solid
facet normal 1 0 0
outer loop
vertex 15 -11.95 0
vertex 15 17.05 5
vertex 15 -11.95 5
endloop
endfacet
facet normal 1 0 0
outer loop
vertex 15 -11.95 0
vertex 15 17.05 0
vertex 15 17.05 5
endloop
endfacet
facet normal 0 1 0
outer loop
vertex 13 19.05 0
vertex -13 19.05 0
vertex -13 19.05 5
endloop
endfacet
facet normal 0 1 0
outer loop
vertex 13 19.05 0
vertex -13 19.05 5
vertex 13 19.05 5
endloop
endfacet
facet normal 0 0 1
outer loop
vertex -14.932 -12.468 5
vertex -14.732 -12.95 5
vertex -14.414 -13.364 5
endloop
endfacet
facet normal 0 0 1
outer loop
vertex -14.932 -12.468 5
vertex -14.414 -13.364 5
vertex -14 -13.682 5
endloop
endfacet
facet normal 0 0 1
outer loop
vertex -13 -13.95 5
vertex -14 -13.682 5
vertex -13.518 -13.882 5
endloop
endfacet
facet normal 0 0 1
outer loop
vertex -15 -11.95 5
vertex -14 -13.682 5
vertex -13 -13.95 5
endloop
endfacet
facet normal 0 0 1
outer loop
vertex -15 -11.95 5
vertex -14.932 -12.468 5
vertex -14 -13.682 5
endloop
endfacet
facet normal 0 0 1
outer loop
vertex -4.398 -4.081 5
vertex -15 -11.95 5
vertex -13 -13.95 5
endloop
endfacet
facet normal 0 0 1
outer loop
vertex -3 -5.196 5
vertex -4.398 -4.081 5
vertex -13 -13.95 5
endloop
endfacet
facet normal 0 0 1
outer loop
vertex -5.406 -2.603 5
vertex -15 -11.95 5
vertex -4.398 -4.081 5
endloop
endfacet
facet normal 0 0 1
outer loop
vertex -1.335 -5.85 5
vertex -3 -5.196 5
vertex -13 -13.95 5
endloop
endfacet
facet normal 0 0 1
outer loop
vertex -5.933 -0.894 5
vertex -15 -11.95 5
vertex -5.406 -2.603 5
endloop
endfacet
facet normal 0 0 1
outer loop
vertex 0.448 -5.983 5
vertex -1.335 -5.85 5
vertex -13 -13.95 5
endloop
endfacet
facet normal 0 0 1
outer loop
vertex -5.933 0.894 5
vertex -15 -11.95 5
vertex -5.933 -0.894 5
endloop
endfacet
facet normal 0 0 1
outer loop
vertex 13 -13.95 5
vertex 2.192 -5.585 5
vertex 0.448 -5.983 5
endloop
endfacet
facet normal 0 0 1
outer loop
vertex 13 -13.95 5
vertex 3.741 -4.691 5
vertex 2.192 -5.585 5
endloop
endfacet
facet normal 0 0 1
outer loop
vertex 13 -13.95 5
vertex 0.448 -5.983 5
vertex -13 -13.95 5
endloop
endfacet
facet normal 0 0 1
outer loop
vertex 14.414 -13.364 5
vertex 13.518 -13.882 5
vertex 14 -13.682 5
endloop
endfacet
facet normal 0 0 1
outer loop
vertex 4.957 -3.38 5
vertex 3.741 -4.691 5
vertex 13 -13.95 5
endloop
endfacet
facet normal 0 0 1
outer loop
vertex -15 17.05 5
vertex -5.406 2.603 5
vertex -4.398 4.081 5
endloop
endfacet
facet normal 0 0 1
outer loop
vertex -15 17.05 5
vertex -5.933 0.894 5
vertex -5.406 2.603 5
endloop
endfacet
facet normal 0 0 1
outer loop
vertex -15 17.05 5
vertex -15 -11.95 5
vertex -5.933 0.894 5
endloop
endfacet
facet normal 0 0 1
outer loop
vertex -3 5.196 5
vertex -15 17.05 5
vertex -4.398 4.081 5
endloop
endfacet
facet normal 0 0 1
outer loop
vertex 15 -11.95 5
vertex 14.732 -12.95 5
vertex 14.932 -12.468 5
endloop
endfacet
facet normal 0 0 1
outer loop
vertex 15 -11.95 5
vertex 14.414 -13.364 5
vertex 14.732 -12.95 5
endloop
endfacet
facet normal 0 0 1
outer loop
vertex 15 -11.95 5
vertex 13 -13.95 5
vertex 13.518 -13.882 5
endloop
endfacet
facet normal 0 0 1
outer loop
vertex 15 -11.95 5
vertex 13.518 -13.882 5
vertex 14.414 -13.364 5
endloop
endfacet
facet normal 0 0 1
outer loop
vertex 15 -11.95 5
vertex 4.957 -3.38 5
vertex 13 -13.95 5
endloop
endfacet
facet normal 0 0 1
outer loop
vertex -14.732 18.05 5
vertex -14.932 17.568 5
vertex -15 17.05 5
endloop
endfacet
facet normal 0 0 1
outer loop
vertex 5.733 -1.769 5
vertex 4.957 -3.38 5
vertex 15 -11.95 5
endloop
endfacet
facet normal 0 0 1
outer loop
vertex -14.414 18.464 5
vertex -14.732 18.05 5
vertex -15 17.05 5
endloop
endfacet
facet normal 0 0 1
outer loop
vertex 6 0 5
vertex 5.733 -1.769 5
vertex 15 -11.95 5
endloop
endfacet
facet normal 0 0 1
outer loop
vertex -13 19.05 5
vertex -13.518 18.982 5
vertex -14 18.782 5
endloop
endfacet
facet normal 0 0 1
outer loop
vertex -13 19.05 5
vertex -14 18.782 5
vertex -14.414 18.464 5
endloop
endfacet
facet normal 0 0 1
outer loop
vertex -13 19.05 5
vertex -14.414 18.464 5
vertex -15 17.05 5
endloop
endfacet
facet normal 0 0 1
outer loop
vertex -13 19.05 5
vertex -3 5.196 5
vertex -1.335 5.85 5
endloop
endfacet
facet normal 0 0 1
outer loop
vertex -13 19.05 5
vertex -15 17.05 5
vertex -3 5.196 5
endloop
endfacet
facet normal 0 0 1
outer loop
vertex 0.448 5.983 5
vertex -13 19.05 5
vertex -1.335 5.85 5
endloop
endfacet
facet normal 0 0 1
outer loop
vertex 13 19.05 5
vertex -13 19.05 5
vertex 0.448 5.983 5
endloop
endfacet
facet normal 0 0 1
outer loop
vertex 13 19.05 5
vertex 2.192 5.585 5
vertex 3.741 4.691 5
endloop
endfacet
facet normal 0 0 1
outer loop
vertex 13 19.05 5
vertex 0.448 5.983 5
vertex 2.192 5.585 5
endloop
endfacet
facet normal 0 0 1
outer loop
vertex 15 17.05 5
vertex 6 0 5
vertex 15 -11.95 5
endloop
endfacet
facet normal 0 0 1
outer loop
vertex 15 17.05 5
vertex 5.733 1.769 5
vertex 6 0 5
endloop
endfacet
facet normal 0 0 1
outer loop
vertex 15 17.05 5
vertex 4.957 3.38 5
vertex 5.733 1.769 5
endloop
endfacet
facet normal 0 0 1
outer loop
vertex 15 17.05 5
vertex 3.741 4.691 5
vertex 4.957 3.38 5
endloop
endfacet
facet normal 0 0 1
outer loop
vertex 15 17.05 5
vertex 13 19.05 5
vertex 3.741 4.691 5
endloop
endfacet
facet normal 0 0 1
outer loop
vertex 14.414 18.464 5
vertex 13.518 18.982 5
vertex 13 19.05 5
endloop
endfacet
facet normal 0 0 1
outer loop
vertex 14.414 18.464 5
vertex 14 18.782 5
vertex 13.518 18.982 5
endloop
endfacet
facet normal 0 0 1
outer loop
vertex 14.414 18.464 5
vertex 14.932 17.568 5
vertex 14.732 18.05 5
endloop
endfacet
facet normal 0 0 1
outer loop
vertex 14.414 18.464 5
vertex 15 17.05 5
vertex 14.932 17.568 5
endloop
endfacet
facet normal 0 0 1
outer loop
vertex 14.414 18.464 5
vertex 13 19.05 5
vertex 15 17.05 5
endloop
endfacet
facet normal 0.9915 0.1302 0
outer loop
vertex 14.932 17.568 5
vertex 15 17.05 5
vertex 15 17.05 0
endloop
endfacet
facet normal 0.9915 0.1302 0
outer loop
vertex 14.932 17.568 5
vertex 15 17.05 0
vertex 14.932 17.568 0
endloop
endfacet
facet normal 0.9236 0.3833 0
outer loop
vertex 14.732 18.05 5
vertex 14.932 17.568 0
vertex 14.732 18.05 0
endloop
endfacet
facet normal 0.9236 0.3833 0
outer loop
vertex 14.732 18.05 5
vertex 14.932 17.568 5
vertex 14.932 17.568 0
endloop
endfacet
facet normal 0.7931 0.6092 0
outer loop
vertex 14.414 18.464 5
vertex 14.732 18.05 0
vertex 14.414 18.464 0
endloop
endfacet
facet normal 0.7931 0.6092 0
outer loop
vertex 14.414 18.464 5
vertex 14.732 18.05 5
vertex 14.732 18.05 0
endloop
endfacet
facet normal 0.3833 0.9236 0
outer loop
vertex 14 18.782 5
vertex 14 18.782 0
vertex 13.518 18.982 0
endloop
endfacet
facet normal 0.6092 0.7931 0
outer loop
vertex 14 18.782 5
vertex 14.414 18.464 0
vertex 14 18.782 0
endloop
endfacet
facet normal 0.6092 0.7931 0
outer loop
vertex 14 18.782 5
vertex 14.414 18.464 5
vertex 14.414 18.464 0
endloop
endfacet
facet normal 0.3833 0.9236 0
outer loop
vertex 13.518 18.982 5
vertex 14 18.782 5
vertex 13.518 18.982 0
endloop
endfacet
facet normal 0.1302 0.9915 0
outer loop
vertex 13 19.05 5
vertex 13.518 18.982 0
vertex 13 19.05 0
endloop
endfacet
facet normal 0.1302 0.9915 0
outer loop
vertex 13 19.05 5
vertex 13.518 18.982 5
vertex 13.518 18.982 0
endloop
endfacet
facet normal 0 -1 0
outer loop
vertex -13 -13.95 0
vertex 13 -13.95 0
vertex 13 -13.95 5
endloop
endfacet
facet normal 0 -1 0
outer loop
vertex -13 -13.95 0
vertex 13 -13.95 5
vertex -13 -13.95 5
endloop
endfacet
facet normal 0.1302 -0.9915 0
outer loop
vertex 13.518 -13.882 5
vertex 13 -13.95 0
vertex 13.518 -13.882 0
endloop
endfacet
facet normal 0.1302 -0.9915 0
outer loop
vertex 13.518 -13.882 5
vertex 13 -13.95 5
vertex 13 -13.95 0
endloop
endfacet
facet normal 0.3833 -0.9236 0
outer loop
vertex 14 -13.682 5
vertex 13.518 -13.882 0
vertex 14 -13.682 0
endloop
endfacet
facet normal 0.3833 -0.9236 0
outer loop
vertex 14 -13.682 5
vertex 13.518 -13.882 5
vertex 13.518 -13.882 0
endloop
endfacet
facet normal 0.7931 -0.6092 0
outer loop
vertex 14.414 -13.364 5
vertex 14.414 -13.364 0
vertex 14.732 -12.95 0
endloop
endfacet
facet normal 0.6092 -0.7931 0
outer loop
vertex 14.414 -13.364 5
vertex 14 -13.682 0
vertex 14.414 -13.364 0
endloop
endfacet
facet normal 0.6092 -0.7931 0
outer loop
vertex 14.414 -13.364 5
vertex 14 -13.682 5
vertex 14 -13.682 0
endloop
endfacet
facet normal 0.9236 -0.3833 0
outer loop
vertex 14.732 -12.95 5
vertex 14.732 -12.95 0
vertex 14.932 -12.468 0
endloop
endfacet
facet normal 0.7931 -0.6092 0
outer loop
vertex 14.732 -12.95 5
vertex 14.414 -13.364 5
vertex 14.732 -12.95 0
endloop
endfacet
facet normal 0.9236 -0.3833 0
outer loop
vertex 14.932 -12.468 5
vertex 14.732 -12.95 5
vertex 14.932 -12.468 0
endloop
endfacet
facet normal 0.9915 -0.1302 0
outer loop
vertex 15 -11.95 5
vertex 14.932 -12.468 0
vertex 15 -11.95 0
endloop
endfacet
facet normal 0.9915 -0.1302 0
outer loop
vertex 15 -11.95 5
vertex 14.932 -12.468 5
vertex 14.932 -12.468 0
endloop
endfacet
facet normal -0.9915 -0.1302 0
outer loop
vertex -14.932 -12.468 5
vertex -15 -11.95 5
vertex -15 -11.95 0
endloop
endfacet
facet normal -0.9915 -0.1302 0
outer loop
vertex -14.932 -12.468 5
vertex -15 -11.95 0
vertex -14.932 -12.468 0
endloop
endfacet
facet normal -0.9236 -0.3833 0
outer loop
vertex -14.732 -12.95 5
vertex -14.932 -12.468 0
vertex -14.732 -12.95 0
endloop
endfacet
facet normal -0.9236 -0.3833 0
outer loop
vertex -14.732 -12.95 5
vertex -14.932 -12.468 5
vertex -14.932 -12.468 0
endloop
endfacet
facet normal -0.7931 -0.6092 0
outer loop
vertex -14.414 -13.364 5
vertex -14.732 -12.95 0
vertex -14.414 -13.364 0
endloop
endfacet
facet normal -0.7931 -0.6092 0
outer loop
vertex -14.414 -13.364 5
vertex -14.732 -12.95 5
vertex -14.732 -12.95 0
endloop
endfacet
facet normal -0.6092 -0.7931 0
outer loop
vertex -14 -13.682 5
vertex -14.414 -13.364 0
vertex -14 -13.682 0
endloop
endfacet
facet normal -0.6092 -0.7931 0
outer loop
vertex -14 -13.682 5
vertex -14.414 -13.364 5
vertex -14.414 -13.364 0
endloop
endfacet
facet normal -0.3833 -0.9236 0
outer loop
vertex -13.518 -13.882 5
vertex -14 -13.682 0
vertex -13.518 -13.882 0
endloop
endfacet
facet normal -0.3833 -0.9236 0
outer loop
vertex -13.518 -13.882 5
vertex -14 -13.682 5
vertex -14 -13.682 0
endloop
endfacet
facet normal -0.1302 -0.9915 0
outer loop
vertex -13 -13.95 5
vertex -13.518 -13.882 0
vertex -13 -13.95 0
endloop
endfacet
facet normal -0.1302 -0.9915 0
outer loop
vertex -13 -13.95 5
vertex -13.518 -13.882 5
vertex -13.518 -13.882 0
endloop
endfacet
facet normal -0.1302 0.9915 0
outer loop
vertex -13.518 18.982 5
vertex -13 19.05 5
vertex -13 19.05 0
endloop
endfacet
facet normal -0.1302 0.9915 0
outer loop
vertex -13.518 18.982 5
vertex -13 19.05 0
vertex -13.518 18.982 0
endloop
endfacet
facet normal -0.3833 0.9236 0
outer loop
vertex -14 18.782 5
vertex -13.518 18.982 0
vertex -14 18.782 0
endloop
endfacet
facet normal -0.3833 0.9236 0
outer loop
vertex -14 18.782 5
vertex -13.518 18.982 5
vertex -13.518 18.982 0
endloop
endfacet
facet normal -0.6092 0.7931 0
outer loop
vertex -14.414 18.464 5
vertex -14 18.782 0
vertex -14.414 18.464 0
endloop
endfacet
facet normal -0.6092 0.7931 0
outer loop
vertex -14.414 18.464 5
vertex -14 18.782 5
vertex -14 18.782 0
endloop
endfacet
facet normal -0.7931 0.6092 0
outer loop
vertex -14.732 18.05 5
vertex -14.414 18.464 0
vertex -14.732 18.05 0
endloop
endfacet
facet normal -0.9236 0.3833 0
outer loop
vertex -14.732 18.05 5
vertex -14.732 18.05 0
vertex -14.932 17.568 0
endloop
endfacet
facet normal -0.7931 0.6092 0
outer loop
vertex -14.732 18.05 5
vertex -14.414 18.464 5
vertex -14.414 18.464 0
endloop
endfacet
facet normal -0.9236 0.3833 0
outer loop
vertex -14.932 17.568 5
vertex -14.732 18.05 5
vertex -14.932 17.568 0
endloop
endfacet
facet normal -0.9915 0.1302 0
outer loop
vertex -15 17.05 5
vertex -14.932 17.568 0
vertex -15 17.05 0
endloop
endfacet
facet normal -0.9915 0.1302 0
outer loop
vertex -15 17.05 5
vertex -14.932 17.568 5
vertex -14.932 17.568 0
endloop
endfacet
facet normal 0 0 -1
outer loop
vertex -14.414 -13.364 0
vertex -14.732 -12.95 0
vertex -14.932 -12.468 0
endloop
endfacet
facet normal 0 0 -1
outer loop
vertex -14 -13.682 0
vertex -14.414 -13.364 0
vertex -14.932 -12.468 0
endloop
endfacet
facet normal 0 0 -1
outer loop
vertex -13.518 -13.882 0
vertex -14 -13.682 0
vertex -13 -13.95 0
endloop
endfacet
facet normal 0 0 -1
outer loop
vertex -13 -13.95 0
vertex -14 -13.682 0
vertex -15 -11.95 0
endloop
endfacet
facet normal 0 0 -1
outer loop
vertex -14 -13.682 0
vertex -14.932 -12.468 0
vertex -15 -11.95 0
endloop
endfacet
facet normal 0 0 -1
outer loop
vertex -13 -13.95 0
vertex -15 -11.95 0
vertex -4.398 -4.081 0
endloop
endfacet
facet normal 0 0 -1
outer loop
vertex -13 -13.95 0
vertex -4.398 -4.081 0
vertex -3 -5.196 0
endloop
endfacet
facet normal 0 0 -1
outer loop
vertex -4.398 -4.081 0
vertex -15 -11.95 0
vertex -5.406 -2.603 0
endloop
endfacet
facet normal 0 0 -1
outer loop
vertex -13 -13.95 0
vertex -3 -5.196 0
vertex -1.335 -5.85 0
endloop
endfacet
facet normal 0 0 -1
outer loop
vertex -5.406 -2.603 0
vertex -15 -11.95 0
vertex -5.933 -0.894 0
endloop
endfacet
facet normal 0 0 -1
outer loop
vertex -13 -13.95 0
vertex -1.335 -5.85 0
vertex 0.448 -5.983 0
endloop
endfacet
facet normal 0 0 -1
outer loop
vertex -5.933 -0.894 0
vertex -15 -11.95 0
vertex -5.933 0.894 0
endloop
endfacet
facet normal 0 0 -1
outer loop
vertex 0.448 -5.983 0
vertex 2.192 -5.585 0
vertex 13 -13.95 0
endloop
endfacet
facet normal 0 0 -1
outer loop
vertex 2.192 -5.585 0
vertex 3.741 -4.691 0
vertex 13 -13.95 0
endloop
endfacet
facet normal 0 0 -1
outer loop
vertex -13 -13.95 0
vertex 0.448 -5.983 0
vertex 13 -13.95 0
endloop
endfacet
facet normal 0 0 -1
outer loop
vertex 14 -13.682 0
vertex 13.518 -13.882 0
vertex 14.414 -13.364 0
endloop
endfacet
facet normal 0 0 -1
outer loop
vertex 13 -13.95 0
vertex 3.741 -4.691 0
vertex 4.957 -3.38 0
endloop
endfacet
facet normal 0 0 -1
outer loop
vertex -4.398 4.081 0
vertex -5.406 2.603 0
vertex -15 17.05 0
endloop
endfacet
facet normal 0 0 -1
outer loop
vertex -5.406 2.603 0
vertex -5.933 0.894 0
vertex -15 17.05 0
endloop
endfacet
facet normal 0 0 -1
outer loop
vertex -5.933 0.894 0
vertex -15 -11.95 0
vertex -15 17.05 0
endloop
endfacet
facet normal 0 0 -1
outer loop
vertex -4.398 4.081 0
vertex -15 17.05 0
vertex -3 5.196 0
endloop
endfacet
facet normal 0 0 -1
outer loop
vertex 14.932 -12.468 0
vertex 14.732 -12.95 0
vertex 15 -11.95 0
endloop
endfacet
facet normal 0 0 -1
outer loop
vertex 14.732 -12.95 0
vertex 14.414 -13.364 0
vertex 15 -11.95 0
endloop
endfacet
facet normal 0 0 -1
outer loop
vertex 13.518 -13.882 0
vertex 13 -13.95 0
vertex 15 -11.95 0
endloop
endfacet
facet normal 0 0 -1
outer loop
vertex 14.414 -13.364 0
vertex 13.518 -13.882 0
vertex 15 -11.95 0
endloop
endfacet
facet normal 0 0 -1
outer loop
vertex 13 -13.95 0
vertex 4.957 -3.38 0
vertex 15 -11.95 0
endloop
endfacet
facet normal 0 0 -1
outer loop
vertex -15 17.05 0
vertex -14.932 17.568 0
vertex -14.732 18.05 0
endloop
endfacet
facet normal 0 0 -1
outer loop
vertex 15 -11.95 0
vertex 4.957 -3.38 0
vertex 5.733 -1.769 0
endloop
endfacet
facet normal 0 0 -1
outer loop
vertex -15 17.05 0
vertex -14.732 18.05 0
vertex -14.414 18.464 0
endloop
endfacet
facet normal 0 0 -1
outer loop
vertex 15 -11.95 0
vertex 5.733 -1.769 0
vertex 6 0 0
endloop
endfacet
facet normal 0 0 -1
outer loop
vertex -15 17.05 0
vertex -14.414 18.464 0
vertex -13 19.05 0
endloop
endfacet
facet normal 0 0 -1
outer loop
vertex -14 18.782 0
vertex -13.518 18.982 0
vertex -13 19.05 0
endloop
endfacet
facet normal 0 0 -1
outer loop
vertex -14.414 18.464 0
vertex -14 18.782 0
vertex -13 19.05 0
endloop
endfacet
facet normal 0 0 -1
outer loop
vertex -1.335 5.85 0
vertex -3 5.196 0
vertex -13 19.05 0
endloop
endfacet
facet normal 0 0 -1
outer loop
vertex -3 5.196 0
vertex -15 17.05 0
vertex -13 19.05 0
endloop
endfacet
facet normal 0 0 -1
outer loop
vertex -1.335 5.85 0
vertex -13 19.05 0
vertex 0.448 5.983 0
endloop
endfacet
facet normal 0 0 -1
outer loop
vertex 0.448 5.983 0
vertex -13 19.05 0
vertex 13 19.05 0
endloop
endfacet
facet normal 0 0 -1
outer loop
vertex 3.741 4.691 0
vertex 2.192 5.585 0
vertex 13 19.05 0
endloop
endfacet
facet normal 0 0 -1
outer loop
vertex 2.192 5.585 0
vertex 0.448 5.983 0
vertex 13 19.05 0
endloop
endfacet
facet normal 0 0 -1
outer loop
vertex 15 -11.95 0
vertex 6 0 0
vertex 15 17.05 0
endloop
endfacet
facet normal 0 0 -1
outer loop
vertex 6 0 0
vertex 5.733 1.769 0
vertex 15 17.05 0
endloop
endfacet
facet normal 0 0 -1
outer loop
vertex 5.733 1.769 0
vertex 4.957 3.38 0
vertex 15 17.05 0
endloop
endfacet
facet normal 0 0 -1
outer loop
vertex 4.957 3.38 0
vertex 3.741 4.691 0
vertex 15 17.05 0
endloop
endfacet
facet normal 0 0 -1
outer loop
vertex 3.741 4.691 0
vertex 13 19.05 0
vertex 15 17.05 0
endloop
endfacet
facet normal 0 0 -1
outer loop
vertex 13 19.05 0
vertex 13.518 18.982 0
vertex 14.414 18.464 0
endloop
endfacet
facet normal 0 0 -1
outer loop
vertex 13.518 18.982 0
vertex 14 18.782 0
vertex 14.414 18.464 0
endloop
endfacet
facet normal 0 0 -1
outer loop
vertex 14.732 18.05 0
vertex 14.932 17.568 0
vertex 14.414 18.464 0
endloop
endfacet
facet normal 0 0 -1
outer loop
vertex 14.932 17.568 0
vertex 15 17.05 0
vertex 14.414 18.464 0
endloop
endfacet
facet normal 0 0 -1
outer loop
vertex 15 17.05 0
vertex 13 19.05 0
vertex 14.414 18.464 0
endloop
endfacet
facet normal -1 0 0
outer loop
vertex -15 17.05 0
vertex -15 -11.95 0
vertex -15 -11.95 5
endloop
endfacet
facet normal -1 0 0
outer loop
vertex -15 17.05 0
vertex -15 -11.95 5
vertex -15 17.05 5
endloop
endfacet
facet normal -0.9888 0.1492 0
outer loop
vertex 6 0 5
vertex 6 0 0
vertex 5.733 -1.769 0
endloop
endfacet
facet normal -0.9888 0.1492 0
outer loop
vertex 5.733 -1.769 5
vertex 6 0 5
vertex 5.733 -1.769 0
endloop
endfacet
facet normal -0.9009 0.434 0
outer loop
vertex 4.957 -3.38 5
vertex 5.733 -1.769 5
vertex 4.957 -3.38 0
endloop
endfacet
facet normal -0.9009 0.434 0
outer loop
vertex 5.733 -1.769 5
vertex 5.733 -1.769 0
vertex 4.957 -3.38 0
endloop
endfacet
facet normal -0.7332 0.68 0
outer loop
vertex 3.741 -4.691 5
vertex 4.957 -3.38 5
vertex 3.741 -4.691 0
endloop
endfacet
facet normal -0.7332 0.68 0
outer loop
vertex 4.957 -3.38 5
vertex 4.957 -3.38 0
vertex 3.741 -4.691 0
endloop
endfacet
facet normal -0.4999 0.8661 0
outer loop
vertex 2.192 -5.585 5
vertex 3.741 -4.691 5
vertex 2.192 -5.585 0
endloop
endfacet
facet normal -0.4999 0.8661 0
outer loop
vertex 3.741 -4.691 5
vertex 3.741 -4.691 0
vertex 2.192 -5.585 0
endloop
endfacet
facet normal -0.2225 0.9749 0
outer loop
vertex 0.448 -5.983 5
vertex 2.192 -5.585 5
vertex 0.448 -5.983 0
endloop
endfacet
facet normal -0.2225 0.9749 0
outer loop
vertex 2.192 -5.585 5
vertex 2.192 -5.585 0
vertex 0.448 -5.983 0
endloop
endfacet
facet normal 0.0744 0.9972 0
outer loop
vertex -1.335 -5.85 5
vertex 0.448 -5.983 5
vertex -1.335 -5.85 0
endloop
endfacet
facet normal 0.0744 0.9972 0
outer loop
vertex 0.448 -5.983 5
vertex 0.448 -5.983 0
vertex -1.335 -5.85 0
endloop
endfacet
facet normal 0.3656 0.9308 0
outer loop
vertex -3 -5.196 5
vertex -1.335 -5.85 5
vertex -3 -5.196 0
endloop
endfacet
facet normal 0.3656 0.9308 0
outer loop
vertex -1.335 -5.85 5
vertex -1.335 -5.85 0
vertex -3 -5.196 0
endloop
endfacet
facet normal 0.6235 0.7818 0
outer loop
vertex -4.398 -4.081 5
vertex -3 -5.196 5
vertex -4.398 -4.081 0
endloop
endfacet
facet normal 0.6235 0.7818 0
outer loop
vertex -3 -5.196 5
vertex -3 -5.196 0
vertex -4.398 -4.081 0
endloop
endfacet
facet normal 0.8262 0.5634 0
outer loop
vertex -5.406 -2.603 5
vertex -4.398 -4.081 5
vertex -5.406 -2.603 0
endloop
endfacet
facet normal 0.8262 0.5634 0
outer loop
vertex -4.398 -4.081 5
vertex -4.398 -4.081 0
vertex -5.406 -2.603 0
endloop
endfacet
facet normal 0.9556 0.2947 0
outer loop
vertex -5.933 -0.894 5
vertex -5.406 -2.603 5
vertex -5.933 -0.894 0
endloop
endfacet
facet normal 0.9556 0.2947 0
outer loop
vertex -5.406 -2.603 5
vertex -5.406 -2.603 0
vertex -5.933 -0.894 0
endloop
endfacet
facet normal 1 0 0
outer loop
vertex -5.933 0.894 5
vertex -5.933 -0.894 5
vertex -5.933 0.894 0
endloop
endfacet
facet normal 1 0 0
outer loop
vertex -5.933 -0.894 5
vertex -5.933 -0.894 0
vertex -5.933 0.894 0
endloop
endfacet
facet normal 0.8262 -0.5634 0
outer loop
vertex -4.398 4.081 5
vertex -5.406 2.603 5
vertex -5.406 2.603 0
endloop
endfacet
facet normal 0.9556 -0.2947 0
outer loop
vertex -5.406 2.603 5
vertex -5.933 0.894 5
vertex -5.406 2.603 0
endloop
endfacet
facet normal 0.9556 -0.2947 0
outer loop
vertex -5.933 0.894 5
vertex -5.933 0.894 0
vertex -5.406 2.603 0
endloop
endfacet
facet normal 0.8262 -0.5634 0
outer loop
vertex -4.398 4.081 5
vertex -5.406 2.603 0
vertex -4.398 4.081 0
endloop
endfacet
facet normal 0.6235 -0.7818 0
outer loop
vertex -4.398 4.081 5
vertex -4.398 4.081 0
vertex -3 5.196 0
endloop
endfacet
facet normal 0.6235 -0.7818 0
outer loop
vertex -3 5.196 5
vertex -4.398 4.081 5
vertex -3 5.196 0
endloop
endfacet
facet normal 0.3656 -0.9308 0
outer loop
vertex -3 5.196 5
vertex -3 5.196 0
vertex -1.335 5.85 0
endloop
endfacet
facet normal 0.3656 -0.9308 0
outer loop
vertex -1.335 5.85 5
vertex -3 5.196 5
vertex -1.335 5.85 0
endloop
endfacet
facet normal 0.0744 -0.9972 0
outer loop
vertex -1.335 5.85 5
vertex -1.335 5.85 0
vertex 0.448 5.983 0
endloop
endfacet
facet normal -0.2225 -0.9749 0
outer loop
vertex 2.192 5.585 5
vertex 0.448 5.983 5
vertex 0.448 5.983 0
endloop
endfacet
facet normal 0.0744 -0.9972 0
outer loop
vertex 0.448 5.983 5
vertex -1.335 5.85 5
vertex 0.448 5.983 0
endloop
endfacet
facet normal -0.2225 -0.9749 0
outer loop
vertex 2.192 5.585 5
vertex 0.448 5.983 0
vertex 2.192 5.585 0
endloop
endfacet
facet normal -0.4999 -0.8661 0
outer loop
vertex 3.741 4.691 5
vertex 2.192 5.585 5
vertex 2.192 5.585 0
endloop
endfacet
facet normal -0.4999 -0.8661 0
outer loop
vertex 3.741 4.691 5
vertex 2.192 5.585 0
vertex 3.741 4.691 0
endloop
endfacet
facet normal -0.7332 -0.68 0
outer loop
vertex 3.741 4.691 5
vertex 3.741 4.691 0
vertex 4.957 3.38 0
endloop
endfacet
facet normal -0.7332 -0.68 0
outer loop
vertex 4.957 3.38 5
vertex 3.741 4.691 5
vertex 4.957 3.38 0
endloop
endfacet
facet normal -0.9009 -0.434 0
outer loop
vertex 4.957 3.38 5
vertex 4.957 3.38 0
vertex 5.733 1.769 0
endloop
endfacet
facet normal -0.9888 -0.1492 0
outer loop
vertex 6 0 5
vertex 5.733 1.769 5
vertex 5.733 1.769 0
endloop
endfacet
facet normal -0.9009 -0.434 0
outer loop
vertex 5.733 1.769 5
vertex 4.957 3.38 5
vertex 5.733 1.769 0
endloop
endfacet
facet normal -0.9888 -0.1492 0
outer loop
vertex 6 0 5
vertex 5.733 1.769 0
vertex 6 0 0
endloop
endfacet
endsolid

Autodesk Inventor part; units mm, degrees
ref_plane "YZ Plane" through (0, 0, 0) normal (1, 0, 0) x (0, 1, 0)
ref_plane "XZ Plane" through (0, 0, 0) normal (0, 1, 0) x (-1, 0, 0)
ref_plane "XY Plane" through (0, 0, 0) normal (0, 0, 1) x (1, 0, 0)
sketch "スケッチ1" plane through (0, 0, 0) normal (0, 0, 1) x (1, 0, 0)
  line L0 (-15, 19.05) -> (15, 19.05)
  line L1 (15, 19.05) -> (15, -13.95)
  line L2 (15, -13.95) -> (-15, -13.95)
  line L3 (-15, -13.95) -> (-15, 19.05)
  point P0 (0, 0)
  dimension "d0" = 30
  dimension "d1" = 33
  dimension "d2" = 19.05
  dimension "d3" = 15
extrude "押し出し1" add sketch "スケッチ1" along normal blind 5
sketch "スケッチ2" plane through (0, 0, 0) normal (0, 0, 1) x (1, 0, 0)
  circle A0 centre (0, 0) radius 6
  dimension "d6" = 12
extrude "押し出し2" cut sketch "スケッチ2" along normal blind 5
fillet "フィレット1" radius 2 4 edges at (15, 19.05, 2.5) (15, -13.95, 2.5) (-15, -13.95, 2.5) (-15, 19.05, 2.5)
properties part number "HbSensorCushion01" material "ゴム"
